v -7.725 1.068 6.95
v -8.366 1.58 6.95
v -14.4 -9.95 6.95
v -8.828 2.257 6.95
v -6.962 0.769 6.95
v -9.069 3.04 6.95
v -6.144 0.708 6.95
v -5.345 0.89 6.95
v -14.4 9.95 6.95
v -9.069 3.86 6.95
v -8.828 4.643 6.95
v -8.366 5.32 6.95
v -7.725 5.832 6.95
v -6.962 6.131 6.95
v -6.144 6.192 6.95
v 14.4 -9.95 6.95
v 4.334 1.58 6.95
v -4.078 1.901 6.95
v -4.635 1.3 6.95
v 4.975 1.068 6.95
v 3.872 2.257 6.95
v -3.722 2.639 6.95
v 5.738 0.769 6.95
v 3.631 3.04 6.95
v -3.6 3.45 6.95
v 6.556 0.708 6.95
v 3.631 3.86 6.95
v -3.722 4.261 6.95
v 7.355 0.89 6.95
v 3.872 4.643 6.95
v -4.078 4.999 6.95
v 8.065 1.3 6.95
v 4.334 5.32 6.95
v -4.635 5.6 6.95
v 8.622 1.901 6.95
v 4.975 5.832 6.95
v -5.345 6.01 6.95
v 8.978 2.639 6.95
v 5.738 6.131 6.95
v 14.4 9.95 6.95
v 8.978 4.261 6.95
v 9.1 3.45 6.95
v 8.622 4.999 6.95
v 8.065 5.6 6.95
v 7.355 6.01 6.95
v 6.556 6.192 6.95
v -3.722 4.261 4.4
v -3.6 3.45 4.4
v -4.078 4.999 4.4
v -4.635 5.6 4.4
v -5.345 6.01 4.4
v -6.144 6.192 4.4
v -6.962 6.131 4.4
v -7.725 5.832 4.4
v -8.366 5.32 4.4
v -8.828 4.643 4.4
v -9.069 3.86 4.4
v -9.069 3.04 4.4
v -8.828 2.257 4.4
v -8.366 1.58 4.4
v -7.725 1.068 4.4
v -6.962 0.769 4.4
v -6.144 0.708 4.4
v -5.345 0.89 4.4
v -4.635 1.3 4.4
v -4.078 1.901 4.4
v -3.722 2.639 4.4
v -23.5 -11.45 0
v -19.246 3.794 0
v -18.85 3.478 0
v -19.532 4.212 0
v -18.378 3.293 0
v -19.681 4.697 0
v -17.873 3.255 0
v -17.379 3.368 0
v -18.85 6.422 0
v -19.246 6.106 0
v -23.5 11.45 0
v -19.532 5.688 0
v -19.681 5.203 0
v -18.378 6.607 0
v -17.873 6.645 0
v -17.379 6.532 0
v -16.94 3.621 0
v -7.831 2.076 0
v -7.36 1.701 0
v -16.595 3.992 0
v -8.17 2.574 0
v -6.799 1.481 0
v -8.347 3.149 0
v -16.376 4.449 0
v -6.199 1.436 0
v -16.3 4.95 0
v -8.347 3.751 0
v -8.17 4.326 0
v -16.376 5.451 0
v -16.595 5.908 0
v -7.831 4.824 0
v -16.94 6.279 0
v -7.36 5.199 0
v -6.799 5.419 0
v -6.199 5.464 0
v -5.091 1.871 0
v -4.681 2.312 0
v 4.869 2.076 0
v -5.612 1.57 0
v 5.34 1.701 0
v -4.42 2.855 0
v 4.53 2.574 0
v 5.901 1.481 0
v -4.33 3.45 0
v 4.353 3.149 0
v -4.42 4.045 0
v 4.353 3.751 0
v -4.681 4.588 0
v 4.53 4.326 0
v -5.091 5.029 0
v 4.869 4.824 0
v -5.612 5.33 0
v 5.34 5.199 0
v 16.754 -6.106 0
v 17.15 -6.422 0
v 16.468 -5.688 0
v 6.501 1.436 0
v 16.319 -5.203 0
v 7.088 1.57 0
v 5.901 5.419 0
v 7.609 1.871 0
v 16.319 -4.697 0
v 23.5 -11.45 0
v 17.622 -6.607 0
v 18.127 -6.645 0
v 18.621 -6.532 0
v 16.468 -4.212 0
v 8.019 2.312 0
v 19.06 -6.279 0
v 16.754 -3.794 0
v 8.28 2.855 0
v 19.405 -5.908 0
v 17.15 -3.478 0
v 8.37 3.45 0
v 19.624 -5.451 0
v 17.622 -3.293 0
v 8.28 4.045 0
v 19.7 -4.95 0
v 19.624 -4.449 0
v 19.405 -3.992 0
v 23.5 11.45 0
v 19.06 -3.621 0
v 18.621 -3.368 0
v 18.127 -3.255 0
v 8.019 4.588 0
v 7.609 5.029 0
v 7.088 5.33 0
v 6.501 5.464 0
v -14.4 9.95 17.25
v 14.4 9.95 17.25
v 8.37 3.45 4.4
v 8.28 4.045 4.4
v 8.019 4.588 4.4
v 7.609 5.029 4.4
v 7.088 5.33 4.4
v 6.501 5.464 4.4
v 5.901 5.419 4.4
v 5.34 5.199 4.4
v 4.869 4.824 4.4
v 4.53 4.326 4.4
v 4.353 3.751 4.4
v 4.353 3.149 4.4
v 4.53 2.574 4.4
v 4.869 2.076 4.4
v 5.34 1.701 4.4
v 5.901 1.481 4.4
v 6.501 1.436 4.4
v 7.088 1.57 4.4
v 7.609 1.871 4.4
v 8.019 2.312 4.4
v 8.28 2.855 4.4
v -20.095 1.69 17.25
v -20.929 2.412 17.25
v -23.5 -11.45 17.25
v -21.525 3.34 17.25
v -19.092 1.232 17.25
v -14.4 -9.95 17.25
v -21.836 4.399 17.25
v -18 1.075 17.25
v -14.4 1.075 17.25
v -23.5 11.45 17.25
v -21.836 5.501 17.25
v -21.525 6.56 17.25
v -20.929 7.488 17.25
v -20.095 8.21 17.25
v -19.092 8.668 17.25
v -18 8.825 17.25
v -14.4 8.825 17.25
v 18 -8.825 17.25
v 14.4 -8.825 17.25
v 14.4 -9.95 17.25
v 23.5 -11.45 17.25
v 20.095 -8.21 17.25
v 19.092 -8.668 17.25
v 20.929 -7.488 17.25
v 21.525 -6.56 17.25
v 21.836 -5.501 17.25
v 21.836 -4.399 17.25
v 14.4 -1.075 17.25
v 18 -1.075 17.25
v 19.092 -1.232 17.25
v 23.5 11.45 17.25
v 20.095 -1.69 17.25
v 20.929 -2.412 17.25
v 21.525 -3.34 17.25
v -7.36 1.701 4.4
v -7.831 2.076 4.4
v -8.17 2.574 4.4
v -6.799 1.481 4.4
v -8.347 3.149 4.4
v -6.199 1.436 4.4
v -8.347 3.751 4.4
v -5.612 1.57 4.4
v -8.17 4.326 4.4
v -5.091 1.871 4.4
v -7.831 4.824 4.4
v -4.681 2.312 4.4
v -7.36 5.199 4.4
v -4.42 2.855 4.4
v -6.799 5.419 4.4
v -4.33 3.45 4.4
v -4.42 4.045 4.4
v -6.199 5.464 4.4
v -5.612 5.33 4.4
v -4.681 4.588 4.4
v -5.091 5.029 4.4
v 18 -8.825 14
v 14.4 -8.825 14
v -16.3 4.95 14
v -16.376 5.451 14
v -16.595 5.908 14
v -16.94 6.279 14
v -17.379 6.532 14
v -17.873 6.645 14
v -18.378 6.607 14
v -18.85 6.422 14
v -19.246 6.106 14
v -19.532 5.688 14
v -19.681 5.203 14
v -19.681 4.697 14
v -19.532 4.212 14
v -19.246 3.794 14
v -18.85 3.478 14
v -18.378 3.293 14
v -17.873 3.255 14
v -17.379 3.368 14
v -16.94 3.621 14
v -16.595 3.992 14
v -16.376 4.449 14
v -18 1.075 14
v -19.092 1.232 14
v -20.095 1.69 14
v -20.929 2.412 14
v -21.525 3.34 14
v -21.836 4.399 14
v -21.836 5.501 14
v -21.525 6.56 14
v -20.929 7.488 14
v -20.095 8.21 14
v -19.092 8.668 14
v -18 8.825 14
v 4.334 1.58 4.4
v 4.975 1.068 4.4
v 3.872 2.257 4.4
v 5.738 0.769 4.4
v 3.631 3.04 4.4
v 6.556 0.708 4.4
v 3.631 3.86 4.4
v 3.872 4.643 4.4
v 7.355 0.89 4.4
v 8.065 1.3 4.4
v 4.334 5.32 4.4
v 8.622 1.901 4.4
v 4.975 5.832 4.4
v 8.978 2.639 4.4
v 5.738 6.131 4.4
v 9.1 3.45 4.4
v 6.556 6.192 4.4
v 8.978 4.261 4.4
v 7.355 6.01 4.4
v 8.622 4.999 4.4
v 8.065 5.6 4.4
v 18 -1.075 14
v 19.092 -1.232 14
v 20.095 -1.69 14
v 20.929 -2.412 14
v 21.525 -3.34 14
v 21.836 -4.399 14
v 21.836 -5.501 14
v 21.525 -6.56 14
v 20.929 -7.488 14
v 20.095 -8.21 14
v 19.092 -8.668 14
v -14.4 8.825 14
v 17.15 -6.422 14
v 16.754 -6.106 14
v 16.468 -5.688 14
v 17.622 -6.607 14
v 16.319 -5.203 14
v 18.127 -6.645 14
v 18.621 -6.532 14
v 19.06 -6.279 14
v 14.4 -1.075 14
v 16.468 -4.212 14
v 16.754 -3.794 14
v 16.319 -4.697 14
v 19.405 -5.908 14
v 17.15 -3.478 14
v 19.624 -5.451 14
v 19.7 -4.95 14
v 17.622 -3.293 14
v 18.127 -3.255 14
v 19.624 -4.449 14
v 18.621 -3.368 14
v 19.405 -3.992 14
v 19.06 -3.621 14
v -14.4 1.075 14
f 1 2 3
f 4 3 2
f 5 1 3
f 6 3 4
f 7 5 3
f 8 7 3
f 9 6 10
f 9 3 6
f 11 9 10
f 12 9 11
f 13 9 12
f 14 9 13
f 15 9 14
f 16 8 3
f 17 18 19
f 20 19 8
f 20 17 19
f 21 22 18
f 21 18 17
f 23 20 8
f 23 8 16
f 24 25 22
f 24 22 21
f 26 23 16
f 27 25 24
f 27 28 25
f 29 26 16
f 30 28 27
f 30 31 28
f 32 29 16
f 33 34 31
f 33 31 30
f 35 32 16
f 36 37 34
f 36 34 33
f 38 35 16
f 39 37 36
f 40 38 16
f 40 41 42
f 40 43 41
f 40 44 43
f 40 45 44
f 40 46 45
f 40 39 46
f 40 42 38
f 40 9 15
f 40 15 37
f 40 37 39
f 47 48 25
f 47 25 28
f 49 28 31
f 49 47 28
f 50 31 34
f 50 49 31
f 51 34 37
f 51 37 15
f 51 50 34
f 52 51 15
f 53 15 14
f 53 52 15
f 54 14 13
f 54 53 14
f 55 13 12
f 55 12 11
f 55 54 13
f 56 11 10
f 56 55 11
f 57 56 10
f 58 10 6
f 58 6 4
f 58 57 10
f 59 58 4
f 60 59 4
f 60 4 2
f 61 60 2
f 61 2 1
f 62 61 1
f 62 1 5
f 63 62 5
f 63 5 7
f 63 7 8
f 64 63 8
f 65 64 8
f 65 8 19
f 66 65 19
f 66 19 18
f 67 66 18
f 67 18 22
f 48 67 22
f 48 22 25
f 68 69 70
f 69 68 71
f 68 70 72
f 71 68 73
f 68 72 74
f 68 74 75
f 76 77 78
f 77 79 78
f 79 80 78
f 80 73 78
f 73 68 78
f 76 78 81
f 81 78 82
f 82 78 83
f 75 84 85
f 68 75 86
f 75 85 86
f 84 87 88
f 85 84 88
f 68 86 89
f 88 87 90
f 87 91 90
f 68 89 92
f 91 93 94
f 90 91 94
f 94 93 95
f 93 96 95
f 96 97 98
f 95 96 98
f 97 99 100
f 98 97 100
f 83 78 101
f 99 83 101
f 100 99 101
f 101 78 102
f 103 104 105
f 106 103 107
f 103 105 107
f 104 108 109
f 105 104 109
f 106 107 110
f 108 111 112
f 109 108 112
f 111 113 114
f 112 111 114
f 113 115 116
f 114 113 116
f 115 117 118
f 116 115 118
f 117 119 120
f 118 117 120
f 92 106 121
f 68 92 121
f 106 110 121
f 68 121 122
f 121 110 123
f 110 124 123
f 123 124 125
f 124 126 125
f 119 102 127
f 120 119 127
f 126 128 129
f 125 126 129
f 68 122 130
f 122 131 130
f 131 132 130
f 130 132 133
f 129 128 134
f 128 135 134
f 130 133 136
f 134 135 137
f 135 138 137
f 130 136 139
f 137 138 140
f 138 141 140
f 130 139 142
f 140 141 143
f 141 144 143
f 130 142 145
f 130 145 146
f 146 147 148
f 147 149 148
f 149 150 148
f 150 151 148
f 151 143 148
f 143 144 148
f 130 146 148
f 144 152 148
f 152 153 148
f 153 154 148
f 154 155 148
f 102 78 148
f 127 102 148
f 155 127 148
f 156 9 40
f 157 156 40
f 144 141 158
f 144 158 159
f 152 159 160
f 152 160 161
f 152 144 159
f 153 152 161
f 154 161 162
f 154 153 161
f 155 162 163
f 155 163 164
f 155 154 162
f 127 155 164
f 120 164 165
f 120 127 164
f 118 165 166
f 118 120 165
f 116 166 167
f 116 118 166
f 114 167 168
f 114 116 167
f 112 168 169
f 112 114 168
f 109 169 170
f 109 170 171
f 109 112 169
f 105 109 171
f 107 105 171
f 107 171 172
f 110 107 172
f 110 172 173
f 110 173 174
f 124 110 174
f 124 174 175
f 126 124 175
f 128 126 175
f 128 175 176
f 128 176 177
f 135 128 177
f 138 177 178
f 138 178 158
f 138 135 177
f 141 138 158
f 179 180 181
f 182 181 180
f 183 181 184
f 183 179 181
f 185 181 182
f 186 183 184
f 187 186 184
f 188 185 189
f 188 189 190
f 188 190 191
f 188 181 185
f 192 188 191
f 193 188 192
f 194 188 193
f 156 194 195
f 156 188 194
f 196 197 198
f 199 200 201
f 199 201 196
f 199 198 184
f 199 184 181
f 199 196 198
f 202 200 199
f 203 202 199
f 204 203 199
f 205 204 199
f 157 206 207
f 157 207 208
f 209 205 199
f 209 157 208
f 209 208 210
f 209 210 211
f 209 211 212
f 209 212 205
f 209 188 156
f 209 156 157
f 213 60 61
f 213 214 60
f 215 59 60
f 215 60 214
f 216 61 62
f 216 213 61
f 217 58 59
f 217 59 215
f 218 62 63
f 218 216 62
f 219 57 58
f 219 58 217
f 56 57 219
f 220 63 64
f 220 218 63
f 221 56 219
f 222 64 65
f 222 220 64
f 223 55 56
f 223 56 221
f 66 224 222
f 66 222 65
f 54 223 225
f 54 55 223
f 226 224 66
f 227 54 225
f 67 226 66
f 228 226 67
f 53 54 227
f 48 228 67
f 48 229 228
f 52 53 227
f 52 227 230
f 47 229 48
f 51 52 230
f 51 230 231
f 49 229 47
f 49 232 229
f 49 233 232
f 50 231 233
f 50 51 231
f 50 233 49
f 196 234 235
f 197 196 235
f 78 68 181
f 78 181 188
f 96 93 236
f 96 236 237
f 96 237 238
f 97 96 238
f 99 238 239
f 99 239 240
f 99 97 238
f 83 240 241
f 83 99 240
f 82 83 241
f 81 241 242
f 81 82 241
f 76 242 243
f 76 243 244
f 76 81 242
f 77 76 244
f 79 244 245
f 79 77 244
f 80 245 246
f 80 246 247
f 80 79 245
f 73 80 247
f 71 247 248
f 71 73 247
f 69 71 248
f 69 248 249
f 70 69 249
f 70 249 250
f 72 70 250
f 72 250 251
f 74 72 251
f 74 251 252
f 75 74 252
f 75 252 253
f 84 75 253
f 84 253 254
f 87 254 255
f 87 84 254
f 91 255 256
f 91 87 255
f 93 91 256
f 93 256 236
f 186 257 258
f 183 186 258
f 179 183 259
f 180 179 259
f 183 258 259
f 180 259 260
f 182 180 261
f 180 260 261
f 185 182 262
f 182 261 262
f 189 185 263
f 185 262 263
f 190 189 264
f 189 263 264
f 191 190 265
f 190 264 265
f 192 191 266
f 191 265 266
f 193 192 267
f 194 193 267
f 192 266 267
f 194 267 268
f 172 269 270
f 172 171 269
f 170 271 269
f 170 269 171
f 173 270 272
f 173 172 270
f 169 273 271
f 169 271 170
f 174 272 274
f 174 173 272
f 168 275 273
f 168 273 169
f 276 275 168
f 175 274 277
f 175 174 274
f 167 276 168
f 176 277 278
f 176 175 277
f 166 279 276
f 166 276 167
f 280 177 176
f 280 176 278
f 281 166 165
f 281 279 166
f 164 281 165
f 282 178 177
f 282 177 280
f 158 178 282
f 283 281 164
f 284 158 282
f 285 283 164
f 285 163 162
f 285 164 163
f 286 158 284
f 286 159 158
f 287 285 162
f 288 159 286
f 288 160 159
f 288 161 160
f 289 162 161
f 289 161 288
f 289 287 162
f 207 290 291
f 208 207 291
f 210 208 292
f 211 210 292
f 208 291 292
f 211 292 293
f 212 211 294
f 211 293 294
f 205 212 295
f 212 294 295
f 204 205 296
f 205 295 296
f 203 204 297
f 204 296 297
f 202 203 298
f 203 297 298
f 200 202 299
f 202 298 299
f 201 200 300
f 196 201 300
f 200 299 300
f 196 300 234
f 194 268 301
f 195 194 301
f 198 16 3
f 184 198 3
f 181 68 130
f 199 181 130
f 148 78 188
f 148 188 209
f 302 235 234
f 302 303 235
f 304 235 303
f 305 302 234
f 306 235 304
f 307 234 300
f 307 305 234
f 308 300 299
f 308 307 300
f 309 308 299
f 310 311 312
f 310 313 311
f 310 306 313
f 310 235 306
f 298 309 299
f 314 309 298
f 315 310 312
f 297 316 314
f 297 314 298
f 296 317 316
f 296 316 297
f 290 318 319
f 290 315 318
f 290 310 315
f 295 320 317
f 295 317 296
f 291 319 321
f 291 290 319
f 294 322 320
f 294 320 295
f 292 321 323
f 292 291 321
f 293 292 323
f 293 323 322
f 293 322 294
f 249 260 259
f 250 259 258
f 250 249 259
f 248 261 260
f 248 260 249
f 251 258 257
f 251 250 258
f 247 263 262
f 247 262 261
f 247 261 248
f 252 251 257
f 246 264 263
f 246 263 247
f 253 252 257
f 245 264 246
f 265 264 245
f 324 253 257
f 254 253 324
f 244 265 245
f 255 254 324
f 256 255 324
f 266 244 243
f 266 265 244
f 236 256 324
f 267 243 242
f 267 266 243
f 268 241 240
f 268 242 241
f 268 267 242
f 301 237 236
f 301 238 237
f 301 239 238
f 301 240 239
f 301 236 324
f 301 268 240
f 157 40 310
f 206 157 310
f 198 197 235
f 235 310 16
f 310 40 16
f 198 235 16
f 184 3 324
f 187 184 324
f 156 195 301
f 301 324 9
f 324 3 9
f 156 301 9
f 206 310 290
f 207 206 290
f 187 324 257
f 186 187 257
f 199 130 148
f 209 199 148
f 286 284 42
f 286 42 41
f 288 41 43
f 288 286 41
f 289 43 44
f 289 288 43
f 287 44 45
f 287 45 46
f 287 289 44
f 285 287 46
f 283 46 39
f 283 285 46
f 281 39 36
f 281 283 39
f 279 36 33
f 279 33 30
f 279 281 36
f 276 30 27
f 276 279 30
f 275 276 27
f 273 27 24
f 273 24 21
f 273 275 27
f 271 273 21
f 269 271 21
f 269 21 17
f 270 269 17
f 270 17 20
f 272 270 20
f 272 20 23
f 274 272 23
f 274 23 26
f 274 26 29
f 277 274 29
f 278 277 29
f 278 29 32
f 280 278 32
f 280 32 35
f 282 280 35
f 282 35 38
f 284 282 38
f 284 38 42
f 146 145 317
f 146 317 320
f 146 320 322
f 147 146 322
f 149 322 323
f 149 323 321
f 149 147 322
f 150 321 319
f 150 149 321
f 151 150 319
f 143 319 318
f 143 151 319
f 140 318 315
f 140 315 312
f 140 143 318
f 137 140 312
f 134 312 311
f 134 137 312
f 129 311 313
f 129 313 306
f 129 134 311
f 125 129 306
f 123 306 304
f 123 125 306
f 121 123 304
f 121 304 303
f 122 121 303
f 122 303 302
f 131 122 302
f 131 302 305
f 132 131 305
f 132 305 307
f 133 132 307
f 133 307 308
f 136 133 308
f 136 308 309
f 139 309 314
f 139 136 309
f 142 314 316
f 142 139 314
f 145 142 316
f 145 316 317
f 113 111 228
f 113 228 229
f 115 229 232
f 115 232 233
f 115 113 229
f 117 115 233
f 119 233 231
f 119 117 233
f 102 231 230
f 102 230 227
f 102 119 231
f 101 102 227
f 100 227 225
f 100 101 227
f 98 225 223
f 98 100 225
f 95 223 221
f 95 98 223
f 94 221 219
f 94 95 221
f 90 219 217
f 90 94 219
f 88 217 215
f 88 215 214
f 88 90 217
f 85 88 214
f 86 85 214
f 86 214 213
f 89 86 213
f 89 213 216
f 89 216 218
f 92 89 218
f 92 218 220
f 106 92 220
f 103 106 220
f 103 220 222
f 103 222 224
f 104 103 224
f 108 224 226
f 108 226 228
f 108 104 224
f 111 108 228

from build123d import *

# Parameters (mm, degrees)
F0_W     = 47
F0_H     = 22.9
F1_DEPTH = 17.25
F0_R     = 2.75
F2_DEPTH = 6.95
F0_R_2   = 1.7
F3_DEPTH = 14
F0_R_3   = 2.02
F4_DEPTH = 4.4


with BuildPart() as f1:
    # F0 (on Top) → F1 (new body)
    with BuildSketch(Plane.XY):
        Rectangle(F0_W, F0_H)
        with BuildLine():
            Line((-14.4, 8.825), (-14.4, 9.95))
            Line((-14.4, 9.95), (14.4, 9.95))
            Line((14.4, 9.95), (14.4, -1.075))
            Line((14.4, -1.075), (18, -1.075))
            ThreePointArc((18, -1.075), (21.875, -4.95), (18, -8.825))
            Line((18, -8.825), (14.4, -8.825))
            Line((14.4, -8.825), (14.4, -9.95))
            Line((14.4, -9.95), (-14.4, -9.95))
            Line((-14.4, -9.95), (-14.4, 1.075))
            Line((-14.4, 1.075), (-18, 1.075))
            ThreePointArc((-18, 1.075), (-21.875, 4.95), (-18, 8.825))
            Line((-18, 8.825), (-14.4, 8.825))
        make_face(mode=Mode.SUBTRACT)
    extrude(amount=F1_DEPTH)

    # F0 (on Top) → F2 (join)
    with BuildSketch(Plane.XY):
        Polygon((14.4, 9.95), (-14.4, 9.95), (-14.4, 8.825), (-14.4, 1.075), (-14.4, -9.95), (14.4, -9.95), (14.4, -8.825), (14.4, -1.075), align=None)
        with Locations((-6.35, 3.45)):
            Circle(F0_R, mode=Mode.SUBTRACT)
        with Locations((6.35, 3.45)):
            Circle(F0_R, mode=Mode.SUBTRACT)
    extrude(amount=F2_DEPTH)

    # F0 (on Top) → F3 (join)
    with BuildSketch(Plane.XY):
        with BuildLine():
            Line((18, -1.075), (14.4, -1.075))
            Line((14.4, -1.075), (14.4, -8.825))
            Line((14.4, -8.825), (18, -8.825))
            ThreePointArc((18, -8.825), (21.875, -4.95), (18, -1.075))
        make_face()
        with Locations((18, -4.95)):
            Circle(F0_R_2, mode=Mode.SUBTRACT)
        with BuildLine():
            Line((-14.4, 1.075), (-14.4, 8.825))
            Line((-14.4, 8.825), (-18, 8.825))
            ThreePointArc((-18, 8.825), (-21.875, 4.95), (-18, 1.075))
            Line((-18, 1.075), (-14.4, 1.075))
        make_face()
        with Locations((-18, 4.95)):
            Circle(F0_R_2, mode=Mode.SUBTRACT)
    extrude(amount=F3_DEPTH)

    # F0 (on Top) → F4 (join)
    with BuildSketch(Plane.XY):
        with Locations((-6.35, 3.45)):
            Circle(F0_R)
        with Locations((-6.35, 3.45)):
            Circle(F0_R_3, mode=Mode.SUBTRACT)
        with Locations((6.35, 3.45)):
            Circle(F0_R)
        with Locations((6.35, 3.45)):
            Circle(F0_R_3, mode=Mode.SUBTRACT)
    extrude(amount=F4_DEPTH)


solid = f1.part
